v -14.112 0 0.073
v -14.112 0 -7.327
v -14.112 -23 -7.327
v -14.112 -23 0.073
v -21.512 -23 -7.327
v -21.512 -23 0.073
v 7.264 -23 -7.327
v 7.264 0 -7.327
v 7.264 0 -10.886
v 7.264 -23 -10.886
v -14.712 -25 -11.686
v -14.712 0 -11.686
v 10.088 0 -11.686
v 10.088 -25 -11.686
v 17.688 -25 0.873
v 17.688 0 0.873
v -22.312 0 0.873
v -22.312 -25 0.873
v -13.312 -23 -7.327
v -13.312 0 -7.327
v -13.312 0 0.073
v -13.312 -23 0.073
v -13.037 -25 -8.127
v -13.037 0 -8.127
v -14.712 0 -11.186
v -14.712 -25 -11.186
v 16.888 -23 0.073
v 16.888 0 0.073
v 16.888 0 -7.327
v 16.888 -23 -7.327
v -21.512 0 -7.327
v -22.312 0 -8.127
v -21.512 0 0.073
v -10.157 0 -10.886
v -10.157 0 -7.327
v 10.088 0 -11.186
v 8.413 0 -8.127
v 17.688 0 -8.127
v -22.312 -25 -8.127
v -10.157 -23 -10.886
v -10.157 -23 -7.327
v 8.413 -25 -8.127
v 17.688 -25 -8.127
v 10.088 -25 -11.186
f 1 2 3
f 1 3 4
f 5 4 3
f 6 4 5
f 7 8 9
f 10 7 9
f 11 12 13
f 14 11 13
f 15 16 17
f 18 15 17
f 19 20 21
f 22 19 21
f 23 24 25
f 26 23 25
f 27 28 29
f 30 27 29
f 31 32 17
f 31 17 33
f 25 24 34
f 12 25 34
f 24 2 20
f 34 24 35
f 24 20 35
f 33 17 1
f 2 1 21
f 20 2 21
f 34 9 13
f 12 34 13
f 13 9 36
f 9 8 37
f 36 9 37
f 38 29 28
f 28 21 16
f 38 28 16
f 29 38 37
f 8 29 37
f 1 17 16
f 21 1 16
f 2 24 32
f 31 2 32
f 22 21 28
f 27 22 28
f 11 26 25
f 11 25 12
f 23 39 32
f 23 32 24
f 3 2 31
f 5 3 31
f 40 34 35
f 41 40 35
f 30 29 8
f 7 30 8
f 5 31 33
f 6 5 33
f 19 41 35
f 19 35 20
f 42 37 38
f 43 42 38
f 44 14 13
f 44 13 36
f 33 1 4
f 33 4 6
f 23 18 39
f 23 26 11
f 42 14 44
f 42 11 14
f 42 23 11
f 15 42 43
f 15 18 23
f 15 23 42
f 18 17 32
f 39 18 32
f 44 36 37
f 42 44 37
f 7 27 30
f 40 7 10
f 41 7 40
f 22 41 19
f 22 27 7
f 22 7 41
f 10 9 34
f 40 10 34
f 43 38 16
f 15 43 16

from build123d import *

# Parameters (mm, degrees)
F1_DEPTH = 25
F2_W     = 7.4
F2_H     = 7.4
F3_DEPTH = 23


with BuildPart() as f1:
    # F0 (on Front) → F1 (new body)
    with BuildSketch(Plane.XZ):
        Polygon((10.088344, -11.686348), (10.088344, -11.186348), (8.413416, -8.127029), (17.688344, -8.127029), (17.688344, 0.872971), (-22.311656, 0.872971), (-22.311656, -8.127029), (-13.036728, -8.127029), (-14.711656, -11.186348), (-14.711656, -11.686348), align=None)
    extrude(amount=F1_DEPTH)

    # F2 (on face) → F3 (cut)
    with BuildSketch(Plane(origin=(0, 0, 0), x_dir=(-1, 0, 0), z_dir=(0, 1, 0))):
        Polygon((-7.263654, -7.327029), (-7.263654, -10.886348), (10.157422, -10.886348), (10.157422, -7.327029), (13.311656, -7.327029), (13.311656, 0.072971), (-16.888344, 0.072971), (-16.888344, -7.327029), align=None)
        with Locations((17.811656, -3.627029)):
            Rectangle(F2_W, F2_H)
    extrude(amount=-F3_DEPTH, mode=Mode.SUBTRACT)


solid = f1.part
